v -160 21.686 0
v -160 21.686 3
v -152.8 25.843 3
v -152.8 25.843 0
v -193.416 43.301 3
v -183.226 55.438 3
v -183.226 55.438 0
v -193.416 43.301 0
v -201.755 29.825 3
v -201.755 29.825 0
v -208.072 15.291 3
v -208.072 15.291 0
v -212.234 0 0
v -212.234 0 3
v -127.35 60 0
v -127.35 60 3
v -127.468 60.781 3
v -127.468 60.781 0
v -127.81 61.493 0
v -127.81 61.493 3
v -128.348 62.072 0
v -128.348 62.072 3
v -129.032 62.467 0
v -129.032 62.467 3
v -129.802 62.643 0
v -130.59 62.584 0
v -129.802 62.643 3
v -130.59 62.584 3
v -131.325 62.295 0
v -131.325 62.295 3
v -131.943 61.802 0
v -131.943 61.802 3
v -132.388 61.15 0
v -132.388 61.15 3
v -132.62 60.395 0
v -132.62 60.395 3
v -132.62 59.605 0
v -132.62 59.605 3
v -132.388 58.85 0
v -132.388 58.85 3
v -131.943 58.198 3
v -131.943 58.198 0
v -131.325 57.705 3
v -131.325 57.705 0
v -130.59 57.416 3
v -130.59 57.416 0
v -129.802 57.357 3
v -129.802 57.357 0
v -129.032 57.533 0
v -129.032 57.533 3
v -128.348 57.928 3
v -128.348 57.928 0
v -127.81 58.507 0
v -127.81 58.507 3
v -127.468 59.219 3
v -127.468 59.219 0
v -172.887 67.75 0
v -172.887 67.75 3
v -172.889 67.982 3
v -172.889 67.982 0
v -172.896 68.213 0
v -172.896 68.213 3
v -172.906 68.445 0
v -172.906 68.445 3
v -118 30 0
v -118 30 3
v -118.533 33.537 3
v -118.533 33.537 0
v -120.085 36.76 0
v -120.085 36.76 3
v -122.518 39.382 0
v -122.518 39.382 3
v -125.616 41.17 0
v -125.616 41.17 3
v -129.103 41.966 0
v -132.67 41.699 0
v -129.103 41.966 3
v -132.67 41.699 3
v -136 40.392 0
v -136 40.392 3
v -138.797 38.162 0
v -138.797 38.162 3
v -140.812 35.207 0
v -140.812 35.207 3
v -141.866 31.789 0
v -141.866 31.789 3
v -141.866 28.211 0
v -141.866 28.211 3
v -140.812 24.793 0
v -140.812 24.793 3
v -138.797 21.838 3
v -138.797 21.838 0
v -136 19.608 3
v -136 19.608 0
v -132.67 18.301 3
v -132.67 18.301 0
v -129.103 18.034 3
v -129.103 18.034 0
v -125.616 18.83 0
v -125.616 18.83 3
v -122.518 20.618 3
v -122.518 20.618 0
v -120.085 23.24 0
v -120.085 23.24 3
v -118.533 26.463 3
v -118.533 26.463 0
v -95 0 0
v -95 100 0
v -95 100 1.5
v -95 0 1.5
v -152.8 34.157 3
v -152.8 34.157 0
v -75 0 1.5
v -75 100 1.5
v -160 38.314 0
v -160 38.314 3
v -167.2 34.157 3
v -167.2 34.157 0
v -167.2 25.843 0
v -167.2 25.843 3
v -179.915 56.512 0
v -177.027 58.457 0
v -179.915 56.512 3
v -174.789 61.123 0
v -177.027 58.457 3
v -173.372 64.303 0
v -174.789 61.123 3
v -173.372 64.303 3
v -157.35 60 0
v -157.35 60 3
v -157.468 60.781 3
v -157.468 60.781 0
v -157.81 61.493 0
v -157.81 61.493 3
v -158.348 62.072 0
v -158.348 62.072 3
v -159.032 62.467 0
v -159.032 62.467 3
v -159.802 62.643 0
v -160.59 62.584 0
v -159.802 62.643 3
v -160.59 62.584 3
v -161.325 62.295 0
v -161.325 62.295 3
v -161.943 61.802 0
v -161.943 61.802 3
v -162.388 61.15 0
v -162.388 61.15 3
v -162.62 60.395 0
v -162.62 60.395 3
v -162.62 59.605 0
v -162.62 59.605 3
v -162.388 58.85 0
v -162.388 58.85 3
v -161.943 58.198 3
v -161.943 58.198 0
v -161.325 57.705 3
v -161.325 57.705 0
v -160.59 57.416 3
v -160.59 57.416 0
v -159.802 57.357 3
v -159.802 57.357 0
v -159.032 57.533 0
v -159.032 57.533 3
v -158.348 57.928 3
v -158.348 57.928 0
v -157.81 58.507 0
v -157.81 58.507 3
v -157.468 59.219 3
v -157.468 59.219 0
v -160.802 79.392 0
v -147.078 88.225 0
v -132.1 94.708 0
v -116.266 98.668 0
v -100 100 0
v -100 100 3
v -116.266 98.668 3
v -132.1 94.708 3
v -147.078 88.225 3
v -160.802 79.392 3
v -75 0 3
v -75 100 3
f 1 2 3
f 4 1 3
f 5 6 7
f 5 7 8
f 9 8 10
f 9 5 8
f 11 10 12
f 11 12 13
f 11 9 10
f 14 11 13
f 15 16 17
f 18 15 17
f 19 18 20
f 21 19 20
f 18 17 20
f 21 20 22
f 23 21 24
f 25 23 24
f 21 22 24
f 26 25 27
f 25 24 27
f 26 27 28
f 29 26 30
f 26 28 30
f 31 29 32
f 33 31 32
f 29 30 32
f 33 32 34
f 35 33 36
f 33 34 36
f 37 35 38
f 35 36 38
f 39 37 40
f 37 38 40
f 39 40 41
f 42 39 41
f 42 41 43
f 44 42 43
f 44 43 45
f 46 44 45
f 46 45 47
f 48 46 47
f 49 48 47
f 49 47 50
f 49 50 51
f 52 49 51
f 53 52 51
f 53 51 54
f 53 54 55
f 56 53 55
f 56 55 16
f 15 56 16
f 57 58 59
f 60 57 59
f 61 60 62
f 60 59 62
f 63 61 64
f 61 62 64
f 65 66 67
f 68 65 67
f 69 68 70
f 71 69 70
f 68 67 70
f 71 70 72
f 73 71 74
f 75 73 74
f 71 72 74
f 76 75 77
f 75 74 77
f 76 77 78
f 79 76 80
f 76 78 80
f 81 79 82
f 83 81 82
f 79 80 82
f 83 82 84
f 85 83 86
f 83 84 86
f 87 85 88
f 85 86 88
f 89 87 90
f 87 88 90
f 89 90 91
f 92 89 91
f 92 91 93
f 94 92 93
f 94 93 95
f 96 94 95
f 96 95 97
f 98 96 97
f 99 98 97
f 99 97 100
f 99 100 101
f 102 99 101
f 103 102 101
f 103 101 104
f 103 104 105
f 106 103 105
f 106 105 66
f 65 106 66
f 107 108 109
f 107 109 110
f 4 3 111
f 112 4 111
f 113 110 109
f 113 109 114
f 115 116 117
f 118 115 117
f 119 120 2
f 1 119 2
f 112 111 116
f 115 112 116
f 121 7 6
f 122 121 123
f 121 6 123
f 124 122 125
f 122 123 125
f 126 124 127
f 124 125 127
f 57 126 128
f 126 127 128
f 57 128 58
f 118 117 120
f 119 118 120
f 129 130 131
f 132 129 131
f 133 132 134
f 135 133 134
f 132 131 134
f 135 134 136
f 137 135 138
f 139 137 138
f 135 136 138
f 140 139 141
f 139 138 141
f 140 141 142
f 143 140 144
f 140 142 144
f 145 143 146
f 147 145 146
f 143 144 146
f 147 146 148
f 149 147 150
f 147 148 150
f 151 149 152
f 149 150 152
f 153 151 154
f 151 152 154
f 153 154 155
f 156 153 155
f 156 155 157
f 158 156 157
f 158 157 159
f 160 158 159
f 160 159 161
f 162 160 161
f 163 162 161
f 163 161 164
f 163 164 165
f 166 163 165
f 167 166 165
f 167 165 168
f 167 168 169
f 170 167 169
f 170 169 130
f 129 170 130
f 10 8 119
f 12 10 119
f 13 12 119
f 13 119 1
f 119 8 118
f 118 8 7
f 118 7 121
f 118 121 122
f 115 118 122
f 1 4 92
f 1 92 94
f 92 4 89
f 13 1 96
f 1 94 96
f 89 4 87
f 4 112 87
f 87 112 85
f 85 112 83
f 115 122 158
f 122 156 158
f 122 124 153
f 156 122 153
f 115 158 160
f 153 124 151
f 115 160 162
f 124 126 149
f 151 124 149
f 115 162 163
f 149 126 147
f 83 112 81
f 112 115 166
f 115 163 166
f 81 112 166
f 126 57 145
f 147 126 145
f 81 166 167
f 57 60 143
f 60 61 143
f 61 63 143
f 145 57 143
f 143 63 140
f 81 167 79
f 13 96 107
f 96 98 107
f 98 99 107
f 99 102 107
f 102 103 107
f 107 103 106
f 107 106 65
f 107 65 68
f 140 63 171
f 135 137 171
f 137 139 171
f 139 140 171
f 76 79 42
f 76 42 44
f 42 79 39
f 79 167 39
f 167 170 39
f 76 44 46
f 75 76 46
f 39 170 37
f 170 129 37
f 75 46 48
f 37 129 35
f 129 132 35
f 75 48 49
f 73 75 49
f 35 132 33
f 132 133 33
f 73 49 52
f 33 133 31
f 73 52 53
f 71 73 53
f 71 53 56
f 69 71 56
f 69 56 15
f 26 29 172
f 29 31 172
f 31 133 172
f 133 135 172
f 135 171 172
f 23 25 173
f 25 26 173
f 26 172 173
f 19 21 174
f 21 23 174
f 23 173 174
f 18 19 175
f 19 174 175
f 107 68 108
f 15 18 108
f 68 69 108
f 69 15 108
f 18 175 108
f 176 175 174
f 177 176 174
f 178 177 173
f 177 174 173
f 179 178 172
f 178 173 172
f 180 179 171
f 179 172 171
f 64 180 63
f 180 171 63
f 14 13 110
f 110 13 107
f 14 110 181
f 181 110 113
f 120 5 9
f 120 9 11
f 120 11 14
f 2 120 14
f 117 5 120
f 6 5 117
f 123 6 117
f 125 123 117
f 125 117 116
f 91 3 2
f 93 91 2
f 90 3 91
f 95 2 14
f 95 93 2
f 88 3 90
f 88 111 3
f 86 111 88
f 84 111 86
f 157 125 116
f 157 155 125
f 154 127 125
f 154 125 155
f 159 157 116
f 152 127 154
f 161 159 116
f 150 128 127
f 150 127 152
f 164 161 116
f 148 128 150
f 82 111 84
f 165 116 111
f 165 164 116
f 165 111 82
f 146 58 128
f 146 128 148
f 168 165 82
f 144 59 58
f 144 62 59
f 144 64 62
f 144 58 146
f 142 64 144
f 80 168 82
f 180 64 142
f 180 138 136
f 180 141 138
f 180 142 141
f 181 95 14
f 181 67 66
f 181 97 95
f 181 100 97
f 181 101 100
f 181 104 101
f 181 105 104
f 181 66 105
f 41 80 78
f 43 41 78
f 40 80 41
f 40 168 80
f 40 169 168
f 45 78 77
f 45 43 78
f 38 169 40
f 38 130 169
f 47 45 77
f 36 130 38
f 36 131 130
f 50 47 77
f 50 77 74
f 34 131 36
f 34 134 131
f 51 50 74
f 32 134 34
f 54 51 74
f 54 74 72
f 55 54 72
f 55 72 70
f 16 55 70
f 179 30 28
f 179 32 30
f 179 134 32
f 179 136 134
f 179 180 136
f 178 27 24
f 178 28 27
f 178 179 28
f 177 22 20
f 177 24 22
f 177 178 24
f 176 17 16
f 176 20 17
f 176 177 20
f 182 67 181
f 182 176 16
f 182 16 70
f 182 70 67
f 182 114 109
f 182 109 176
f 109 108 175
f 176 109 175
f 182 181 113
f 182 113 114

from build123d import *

# Parameters (mm, degrees)
F1_DEPTH  = 3
F3_DEPTH  = 25
F4_R      = 5
F5_R      = 12
F5_R_2    = 2.65
F6_DEPTH  = 25
F7_W      = 78
F7_H      = 55.5
F7_R      = 2
F8_DEPTH  = 25
F9_R      = 8.15
F10_DEPTH = 25
F12_W     = 300.7349916597
F12_H     = 105.2985801398
F13_DEPTH = 25
F14_W     = 20
F14_H     = 100
F15_DEPTH = 1.5
F17_DEPTH = 25
F19_DEPTH = 3


with BuildPart() as f1:
    # F0 (on Top) → F1 (new body)
    with BuildSketch(Plane.XY):
        with BuildLine():
            Line((-197.8147600734, 20.7911690818), (-202.2340594865, 0))
            Line((-202.2340594865, 0), (216.0975214603, 0))
            Line((216.0975214603, 0), (209.2885731253, 20.7911690818))
            ThreePointArc((209.2885731253, 20.7911690818), (167.4870934164, 78.1154778874), (100, 100))
            Line((100, 100), (-100, 100))
            ThreePointArc((-100, 100), (-162.932039105, 77.7145961457), (-197.8147600734, 20.7911690818))
        make_face()
    extrude(amount=F1_DEPTH)

    # F2 (on face) → F3 (cut)
    with BuildSketch(Plane.XY.offset(3)):
        with BuildLine():
            ThreePointArc((1.5842979518, 0), (9.4530988092, 4.1693984068), (12.6, 12.5))
            ThreePointArc((12.6, 12.5), (12.2192388124, 15.5741182224), (11.0999678023, 18.4624420155))
            ThreePointArc((11.0999678023, 18.4624420155), (0, 25.1), (-11.0999678023, 18.4624420155))
            ThreePointArc((-11.0999678023, 18.4624420155), (-11.1999147641, 6.7274867453), (-1.5842979518, 0))
            Line((-1.5842979518, 0), (1.5842979518, 0))
        make_face()
        with BuildLine():
            ThreePointArc((11.0999678023, 18.4624420155), (12.2192388124, 15.5741182224), (12.6, 12.5))
            ThreePointArc((12.6, 12.5), (9.4530988092, 4.1693984068), (1.5842979518, 0))
            Line((1.5842979518, 0), (21.7592636698, 0))
            Line((21.7592636698, 0), (11.0999678023, 18.4624420155))
        make_face()
        with BuildLine():
            ThreePointArc((-1.5842979518, 0), (0, -0.1), (1.5842979518, 0))
            Line((1.5842979518, 0), (-1.5842979518, 0))
        make_face()
        with BuildLine():
            ThreePointArc((-1.5842979518, 0), (-11.1999147641, 6.7274867453), (-11.0999678023, 18.4624420155))
            Line((-11.0999678023, 18.4624420155), (-21.7592636698, 0))
            Line((-21.7592636698, 0), (-1.5842979518, 0))
        make_face()
    extrude(amount=-F3_DEPTH, mode=Mode.SUBTRACT)

    # F4
    f4_edges = [f1.edges().sort_by_distance(p)[0] for p in [
        (-21.759264, 0, 1.5),
        (21.759264, 0, 1.5),
    ]]
    fillet(f4_edges, radius=F4_R)

    # F5 (on face) → F6 (cut)
    with BuildSketch(Plane.XY.offset(3)):
        Polygon((-160, 38.3138438763), (-167.2, 34.1569219382), (-167.2, 25.8430780618), (-160, 21.6861561237), (-152.8, 25.8430780618), (-152.8, 34.1569219382), align=None)
        with Locations((-130, 30)):
            Circle(F5_R)
        with Locations((-130, 60)):
            Circle(F5_R_2)
        with Locations((-160, 60)):
            Circle(F5_R_2)
    extrude(amount=-F6_DEPTH, mode=Mode.SUBTRACT)

    # F7 (on face) → F8 (cut)
    with BuildSketch(Plane.XY.offset(3)):
        with Locations((0, 57.75)):
            Rectangle(F7_W, F7_H)
        with Locations((-42.6313167033, 28.25)):
            Circle(F7_R)
        with Locations((-42.6313167033, 87.25)):
            Circle(F7_R)
        with Locations((42.3686832967, 87.25)):
            Circle(F7_R)
        with Locations((42.3686832967, 28.25)):
            Circle(F7_R)
    extrude(amount=-F8_DEPTH, mode=Mode.SUBTRACT)

    # F9 (on face) → F10 (cut)
    with BuildSketch(Plane.XY.offset(3)):
        with Locations((115, 30)):
            Circle(F9_R)
    extrude(amount=-F10_DEPTH, mode=Mode.SUBTRACT)

    # F12 (on face) → F13 (cut)
    with BuildSketch(Plane.XY.offset(3)):
        with Locations((75.3674958299, 52.6492900699)):
            Rectangle(F12_W, F12_H)
    extrude(amount=-F13_DEPTH, mode=Mode.SUBTRACT)

    # F14 (on face) → F15 (cut)
    with BuildSketch(Plane(origin=(0, 0, 0), x_dir=(1, 0, 0), z_dir=(0, 0, -1))):
        with Locations((-85, -50)):
            Rectangle(F14_W, F14_H)
    extrude(amount=-F15_DEPTH, mode=Mode.SUBTRACT)

    # F16 (on face) → F17 (cut)
    with BuildSketch(Plane.XY.offset(3)):
        with BuildLine():
            ThreePointArc((-183.2262560087, 55.4381665532), (-175.8146533038, 59.7113164576), (-172.8869867134, 67.75))
            ThreePointArc((-172.8869867134, 67.75), (-172.891816845, 68.0974621682), (-172.9063035068, 68.4446558102))
            ThreePointArc((-172.9063035068, 68.4446558102), (-178.3366850582, 62.1559633028), (-183.2262560087, 55.4381665532))
        make_face()
        with BuildLine():
            ThreePointArc((-183.2262560087, 55.4381665532), (-178.3366850582, 62.1559633028), (-172.9063035068, 68.4446558102))
            ThreePointArc((-172.9063035068, 68.4446558102), (-195.1790723457, 75.5194954128), (-183.2262560087, 55.4381665532))
        make_face()
    extrude(amount=-F17_DEPTH, mode=Mode.SUBTRACT)

    # F18 (on face) → F19 (join)
    with BuildSketch(Plane.XY.offset(3)):
        with BuildLine():
            Line((-183.2262560087, 0), (-183.2262560087, 55.4381665532))
            ThreePointArc((-183.2262560087, 55.4381665532), (-201.7549584248, 29.8250444644), (-212.2340594865, 0))
            Line((-212.2340594865, 0), (-183.2262560087, 0))
        make_face()
    extrude(amount=-F19_DEPTH)


solid = f1.part
